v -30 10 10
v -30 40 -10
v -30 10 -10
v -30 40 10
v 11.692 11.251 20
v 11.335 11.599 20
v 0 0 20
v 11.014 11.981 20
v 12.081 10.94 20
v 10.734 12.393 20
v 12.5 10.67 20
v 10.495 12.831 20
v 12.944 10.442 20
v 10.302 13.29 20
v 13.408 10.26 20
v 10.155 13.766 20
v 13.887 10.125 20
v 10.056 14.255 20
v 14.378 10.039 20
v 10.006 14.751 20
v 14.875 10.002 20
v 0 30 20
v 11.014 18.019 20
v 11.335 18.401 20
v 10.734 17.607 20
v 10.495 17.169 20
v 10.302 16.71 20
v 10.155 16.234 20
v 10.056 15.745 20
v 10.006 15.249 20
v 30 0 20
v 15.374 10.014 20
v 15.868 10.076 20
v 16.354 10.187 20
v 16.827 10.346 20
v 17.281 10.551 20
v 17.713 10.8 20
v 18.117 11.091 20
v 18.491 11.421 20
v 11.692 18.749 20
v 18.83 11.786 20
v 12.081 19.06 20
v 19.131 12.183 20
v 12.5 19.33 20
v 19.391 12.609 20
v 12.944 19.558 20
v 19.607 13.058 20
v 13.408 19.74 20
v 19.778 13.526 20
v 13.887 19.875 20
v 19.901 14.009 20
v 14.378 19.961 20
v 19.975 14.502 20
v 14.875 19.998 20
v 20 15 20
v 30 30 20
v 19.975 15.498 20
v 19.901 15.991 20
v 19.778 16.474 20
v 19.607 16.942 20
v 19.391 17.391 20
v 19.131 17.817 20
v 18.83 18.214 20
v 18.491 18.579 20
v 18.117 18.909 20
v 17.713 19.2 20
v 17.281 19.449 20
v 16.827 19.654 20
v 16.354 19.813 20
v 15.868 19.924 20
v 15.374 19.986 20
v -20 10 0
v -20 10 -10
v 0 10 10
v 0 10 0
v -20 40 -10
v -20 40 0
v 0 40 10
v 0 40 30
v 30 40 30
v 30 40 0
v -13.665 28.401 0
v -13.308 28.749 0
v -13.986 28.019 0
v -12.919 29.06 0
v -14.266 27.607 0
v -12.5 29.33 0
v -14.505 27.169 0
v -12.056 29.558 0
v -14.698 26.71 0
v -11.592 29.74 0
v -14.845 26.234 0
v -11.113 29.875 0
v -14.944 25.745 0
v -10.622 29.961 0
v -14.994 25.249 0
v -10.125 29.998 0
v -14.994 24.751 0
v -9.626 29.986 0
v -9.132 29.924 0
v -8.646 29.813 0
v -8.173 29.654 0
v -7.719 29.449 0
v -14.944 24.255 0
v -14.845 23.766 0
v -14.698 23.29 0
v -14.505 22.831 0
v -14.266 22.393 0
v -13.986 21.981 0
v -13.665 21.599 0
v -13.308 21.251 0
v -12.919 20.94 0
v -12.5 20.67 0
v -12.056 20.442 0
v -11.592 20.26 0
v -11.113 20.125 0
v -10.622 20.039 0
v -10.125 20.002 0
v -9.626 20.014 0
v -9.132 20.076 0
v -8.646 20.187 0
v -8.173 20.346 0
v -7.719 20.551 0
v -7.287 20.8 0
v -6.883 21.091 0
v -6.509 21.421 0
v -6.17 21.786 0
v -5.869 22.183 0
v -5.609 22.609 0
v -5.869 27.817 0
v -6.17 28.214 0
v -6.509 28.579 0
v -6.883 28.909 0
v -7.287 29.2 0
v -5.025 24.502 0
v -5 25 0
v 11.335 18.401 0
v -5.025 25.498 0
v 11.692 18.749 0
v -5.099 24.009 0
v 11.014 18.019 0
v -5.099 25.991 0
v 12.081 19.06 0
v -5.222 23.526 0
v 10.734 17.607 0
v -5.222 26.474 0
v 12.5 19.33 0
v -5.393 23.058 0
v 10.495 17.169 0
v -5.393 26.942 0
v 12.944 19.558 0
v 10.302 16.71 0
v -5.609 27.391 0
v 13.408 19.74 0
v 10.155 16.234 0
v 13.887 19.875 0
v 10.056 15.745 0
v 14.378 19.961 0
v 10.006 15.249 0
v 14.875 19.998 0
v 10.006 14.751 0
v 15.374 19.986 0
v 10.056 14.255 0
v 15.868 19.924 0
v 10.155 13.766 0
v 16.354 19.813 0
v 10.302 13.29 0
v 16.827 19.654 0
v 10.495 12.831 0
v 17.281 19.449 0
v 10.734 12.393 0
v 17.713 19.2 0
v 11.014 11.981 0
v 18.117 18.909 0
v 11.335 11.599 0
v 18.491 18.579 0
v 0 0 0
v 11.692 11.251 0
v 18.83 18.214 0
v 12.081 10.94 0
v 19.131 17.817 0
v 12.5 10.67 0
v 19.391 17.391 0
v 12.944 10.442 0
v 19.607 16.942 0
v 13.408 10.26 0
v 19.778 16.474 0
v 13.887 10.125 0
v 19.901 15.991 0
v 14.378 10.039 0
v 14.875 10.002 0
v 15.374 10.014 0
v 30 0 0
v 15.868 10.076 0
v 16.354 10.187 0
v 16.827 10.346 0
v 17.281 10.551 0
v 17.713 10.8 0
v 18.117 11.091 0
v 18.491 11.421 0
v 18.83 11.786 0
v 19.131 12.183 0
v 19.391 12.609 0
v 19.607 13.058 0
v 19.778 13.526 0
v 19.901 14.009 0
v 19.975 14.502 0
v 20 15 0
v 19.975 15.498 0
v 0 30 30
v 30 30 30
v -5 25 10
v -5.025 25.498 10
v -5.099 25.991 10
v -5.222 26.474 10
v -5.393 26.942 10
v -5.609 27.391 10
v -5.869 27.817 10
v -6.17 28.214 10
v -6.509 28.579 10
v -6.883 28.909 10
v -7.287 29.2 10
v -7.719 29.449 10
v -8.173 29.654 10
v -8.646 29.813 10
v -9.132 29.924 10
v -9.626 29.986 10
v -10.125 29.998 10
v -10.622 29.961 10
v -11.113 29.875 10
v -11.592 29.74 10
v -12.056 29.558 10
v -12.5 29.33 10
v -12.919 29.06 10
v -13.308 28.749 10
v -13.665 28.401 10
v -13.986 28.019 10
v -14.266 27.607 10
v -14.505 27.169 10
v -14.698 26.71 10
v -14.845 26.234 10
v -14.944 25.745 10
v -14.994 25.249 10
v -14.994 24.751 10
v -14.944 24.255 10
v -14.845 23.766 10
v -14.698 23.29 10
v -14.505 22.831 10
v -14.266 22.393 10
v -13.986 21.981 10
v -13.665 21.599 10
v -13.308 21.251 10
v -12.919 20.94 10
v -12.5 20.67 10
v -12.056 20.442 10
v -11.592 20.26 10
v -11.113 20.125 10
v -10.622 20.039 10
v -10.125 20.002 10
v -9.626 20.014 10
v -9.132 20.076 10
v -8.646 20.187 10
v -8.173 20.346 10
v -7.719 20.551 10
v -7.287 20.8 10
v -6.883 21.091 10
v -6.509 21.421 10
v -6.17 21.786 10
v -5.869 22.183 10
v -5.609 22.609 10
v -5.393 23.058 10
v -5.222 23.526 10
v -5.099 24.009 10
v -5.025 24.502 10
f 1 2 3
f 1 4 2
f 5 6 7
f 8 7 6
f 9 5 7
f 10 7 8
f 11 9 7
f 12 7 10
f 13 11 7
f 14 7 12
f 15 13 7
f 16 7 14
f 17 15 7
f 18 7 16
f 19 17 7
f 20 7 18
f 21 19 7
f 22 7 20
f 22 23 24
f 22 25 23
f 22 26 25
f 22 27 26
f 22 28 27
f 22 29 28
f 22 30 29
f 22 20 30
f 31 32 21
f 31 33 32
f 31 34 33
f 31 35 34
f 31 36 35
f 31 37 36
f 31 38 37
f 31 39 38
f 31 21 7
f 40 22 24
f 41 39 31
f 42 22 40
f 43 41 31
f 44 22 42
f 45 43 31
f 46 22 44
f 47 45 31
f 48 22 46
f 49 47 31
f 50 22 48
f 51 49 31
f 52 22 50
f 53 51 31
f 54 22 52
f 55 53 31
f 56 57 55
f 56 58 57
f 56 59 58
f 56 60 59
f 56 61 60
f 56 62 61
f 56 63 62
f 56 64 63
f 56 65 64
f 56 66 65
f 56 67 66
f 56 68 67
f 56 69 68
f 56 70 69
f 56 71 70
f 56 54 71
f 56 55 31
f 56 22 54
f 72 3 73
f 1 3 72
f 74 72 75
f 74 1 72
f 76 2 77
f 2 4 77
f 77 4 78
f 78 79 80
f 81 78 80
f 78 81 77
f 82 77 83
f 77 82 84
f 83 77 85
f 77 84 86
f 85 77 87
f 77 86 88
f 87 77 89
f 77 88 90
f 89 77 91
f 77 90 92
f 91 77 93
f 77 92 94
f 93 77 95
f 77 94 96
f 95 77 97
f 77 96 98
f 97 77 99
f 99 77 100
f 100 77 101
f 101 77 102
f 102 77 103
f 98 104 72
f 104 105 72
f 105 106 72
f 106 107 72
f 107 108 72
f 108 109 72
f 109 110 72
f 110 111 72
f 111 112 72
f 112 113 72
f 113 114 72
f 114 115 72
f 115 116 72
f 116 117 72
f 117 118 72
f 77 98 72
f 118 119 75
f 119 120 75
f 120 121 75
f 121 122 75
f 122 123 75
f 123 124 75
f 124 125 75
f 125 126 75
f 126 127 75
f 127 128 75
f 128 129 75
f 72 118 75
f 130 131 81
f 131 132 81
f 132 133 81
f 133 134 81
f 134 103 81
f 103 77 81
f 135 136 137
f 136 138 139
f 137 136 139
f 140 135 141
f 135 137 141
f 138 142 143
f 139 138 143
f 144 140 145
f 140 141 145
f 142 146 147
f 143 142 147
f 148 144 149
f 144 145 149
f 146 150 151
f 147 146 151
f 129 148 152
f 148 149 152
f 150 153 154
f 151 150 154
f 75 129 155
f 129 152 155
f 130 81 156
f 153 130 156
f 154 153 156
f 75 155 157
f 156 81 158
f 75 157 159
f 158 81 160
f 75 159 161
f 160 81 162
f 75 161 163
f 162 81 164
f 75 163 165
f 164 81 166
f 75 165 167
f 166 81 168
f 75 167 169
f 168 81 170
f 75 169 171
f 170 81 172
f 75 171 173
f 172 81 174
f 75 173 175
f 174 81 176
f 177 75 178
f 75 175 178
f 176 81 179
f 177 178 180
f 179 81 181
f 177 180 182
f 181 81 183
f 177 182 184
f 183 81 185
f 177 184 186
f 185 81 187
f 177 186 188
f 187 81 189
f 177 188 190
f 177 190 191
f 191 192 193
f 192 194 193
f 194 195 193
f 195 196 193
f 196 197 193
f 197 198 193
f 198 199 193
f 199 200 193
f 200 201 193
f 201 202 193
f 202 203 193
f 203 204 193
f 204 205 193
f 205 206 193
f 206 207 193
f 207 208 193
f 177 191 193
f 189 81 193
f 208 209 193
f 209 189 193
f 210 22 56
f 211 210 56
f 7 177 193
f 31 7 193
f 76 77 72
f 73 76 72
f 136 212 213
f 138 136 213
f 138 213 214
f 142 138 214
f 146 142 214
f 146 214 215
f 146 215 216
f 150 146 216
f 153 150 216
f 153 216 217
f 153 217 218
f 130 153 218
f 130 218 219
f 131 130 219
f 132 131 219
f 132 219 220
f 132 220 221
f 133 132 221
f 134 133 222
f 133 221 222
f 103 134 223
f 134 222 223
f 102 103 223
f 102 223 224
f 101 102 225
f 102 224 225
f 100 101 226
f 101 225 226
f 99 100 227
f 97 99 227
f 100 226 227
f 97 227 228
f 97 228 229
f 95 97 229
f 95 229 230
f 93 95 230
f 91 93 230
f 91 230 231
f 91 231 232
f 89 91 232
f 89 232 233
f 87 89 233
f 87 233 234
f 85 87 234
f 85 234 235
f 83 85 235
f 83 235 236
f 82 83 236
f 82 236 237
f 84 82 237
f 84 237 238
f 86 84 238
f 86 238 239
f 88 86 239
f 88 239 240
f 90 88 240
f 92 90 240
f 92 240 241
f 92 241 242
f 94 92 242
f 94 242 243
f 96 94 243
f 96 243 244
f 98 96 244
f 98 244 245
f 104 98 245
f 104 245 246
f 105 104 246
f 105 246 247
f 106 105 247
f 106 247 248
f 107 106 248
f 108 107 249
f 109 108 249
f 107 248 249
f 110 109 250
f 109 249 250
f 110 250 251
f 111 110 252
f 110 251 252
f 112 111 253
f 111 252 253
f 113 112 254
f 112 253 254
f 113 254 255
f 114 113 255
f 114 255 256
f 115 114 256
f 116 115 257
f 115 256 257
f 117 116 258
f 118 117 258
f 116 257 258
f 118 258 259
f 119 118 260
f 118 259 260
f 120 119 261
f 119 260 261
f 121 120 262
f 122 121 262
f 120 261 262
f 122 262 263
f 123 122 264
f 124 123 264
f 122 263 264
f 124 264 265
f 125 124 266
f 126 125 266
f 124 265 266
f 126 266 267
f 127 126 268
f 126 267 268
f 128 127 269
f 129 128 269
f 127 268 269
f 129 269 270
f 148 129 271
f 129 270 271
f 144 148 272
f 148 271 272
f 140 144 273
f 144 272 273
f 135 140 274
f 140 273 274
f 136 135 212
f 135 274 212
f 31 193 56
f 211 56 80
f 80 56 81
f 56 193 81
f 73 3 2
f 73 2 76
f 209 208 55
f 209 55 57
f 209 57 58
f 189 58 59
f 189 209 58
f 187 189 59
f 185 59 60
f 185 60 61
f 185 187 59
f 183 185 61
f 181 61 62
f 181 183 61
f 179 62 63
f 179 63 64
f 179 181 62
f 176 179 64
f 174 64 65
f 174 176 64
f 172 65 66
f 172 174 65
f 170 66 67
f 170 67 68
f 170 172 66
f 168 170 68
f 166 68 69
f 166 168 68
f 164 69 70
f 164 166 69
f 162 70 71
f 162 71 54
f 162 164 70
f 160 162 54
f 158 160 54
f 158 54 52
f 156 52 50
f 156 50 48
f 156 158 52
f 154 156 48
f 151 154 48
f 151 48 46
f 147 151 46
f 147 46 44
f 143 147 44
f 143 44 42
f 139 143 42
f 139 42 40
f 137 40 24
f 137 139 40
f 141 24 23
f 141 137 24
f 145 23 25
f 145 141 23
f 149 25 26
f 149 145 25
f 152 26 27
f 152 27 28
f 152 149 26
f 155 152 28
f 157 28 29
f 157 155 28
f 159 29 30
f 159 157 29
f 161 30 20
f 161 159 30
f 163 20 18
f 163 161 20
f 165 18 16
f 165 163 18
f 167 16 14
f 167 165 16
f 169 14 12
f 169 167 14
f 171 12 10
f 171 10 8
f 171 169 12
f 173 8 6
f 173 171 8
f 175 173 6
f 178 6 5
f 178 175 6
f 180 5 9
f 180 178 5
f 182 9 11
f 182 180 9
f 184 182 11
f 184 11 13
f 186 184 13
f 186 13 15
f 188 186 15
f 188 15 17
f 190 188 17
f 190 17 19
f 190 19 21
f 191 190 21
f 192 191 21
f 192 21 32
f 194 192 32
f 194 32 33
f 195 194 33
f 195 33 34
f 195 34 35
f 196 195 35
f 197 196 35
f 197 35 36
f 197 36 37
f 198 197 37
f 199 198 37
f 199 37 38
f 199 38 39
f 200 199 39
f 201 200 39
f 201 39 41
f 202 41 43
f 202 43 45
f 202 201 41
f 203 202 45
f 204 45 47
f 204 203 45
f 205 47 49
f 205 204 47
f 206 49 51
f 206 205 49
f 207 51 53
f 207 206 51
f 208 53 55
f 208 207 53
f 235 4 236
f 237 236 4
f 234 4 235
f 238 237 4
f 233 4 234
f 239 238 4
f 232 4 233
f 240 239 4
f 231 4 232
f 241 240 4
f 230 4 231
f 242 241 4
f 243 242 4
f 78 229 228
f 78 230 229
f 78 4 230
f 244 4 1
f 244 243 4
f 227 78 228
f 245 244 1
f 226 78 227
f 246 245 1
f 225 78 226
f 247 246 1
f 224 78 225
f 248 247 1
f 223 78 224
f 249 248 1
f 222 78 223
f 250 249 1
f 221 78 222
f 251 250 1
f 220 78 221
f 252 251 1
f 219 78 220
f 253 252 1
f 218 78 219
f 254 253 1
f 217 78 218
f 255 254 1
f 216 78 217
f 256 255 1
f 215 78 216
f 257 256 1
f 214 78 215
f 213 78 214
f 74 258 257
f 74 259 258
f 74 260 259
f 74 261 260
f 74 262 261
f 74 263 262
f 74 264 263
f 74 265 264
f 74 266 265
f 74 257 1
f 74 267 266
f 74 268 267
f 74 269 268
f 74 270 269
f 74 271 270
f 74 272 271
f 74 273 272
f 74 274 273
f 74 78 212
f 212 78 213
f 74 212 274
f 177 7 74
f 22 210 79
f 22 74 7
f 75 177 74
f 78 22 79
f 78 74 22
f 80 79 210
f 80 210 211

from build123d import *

# Parameters (mm, degrees)
F0_W     = 30
F0_H     = 40
F0_R     = 5
F1_DEPTH = 20
F2_W     = 30
F2_H     = 10
F3_DEPTH = 10
F4_W     = 30
F4_H     = 10
F5_DEPTH = 30
F6_R     = 5
F7_DEPTH = 25
F8_W     = 10
F8_H     = 30
F9_DEPTH = 10


with BuildPart() as f1:
    # F0 (on Top) → F1 (new body)
    with BuildSketch(Plane.XY):
        with Locations((15, 20)):
            Rectangle(F0_W, F0_H)
        with Locations((15, 15)):
            Circle(F0_R, mode=Mode.SUBTRACT)
    extrude(amount=F1_DEPTH)

    # F2 (on face) → F3 (join)
    with BuildSketch(Plane.XY.offset(20)):
        with Locations((15, 35)):
            Rectangle(F2_W, F2_H)
    extrude(amount=F3_DEPTH)

    # F4 (on face) → F5 (join)
    with BuildSketch(Plane(origin=(0, 0, 0), x_dir=(0, -1, 0), z_dir=(-1, 0, 0))):
        with Locations((-25, 5)):
            Rectangle(F4_W, F4_H)
    extrude(amount=F5_DEPTH)

    # F6 (on face) → F7 (cut)
    with BuildSketch(Plane.XY.offset(10)):
        with Locations((-10, 25)):
            Circle(F6_R)
    extrude(amount=-F7_DEPTH, mode=Mode.SUBTRACT)

    # F8 (on face) → F9 (join)
    with BuildSketch(Plane(origin=(0, 0, 0), x_dir=(1, 0, 0), z_dir=(0, 0, -1))):
        with Locations((-25, -25)):
            Rectangle(F8_W, F8_H)
    extrude(amount=F9_DEPTH)


solid = f1.part
